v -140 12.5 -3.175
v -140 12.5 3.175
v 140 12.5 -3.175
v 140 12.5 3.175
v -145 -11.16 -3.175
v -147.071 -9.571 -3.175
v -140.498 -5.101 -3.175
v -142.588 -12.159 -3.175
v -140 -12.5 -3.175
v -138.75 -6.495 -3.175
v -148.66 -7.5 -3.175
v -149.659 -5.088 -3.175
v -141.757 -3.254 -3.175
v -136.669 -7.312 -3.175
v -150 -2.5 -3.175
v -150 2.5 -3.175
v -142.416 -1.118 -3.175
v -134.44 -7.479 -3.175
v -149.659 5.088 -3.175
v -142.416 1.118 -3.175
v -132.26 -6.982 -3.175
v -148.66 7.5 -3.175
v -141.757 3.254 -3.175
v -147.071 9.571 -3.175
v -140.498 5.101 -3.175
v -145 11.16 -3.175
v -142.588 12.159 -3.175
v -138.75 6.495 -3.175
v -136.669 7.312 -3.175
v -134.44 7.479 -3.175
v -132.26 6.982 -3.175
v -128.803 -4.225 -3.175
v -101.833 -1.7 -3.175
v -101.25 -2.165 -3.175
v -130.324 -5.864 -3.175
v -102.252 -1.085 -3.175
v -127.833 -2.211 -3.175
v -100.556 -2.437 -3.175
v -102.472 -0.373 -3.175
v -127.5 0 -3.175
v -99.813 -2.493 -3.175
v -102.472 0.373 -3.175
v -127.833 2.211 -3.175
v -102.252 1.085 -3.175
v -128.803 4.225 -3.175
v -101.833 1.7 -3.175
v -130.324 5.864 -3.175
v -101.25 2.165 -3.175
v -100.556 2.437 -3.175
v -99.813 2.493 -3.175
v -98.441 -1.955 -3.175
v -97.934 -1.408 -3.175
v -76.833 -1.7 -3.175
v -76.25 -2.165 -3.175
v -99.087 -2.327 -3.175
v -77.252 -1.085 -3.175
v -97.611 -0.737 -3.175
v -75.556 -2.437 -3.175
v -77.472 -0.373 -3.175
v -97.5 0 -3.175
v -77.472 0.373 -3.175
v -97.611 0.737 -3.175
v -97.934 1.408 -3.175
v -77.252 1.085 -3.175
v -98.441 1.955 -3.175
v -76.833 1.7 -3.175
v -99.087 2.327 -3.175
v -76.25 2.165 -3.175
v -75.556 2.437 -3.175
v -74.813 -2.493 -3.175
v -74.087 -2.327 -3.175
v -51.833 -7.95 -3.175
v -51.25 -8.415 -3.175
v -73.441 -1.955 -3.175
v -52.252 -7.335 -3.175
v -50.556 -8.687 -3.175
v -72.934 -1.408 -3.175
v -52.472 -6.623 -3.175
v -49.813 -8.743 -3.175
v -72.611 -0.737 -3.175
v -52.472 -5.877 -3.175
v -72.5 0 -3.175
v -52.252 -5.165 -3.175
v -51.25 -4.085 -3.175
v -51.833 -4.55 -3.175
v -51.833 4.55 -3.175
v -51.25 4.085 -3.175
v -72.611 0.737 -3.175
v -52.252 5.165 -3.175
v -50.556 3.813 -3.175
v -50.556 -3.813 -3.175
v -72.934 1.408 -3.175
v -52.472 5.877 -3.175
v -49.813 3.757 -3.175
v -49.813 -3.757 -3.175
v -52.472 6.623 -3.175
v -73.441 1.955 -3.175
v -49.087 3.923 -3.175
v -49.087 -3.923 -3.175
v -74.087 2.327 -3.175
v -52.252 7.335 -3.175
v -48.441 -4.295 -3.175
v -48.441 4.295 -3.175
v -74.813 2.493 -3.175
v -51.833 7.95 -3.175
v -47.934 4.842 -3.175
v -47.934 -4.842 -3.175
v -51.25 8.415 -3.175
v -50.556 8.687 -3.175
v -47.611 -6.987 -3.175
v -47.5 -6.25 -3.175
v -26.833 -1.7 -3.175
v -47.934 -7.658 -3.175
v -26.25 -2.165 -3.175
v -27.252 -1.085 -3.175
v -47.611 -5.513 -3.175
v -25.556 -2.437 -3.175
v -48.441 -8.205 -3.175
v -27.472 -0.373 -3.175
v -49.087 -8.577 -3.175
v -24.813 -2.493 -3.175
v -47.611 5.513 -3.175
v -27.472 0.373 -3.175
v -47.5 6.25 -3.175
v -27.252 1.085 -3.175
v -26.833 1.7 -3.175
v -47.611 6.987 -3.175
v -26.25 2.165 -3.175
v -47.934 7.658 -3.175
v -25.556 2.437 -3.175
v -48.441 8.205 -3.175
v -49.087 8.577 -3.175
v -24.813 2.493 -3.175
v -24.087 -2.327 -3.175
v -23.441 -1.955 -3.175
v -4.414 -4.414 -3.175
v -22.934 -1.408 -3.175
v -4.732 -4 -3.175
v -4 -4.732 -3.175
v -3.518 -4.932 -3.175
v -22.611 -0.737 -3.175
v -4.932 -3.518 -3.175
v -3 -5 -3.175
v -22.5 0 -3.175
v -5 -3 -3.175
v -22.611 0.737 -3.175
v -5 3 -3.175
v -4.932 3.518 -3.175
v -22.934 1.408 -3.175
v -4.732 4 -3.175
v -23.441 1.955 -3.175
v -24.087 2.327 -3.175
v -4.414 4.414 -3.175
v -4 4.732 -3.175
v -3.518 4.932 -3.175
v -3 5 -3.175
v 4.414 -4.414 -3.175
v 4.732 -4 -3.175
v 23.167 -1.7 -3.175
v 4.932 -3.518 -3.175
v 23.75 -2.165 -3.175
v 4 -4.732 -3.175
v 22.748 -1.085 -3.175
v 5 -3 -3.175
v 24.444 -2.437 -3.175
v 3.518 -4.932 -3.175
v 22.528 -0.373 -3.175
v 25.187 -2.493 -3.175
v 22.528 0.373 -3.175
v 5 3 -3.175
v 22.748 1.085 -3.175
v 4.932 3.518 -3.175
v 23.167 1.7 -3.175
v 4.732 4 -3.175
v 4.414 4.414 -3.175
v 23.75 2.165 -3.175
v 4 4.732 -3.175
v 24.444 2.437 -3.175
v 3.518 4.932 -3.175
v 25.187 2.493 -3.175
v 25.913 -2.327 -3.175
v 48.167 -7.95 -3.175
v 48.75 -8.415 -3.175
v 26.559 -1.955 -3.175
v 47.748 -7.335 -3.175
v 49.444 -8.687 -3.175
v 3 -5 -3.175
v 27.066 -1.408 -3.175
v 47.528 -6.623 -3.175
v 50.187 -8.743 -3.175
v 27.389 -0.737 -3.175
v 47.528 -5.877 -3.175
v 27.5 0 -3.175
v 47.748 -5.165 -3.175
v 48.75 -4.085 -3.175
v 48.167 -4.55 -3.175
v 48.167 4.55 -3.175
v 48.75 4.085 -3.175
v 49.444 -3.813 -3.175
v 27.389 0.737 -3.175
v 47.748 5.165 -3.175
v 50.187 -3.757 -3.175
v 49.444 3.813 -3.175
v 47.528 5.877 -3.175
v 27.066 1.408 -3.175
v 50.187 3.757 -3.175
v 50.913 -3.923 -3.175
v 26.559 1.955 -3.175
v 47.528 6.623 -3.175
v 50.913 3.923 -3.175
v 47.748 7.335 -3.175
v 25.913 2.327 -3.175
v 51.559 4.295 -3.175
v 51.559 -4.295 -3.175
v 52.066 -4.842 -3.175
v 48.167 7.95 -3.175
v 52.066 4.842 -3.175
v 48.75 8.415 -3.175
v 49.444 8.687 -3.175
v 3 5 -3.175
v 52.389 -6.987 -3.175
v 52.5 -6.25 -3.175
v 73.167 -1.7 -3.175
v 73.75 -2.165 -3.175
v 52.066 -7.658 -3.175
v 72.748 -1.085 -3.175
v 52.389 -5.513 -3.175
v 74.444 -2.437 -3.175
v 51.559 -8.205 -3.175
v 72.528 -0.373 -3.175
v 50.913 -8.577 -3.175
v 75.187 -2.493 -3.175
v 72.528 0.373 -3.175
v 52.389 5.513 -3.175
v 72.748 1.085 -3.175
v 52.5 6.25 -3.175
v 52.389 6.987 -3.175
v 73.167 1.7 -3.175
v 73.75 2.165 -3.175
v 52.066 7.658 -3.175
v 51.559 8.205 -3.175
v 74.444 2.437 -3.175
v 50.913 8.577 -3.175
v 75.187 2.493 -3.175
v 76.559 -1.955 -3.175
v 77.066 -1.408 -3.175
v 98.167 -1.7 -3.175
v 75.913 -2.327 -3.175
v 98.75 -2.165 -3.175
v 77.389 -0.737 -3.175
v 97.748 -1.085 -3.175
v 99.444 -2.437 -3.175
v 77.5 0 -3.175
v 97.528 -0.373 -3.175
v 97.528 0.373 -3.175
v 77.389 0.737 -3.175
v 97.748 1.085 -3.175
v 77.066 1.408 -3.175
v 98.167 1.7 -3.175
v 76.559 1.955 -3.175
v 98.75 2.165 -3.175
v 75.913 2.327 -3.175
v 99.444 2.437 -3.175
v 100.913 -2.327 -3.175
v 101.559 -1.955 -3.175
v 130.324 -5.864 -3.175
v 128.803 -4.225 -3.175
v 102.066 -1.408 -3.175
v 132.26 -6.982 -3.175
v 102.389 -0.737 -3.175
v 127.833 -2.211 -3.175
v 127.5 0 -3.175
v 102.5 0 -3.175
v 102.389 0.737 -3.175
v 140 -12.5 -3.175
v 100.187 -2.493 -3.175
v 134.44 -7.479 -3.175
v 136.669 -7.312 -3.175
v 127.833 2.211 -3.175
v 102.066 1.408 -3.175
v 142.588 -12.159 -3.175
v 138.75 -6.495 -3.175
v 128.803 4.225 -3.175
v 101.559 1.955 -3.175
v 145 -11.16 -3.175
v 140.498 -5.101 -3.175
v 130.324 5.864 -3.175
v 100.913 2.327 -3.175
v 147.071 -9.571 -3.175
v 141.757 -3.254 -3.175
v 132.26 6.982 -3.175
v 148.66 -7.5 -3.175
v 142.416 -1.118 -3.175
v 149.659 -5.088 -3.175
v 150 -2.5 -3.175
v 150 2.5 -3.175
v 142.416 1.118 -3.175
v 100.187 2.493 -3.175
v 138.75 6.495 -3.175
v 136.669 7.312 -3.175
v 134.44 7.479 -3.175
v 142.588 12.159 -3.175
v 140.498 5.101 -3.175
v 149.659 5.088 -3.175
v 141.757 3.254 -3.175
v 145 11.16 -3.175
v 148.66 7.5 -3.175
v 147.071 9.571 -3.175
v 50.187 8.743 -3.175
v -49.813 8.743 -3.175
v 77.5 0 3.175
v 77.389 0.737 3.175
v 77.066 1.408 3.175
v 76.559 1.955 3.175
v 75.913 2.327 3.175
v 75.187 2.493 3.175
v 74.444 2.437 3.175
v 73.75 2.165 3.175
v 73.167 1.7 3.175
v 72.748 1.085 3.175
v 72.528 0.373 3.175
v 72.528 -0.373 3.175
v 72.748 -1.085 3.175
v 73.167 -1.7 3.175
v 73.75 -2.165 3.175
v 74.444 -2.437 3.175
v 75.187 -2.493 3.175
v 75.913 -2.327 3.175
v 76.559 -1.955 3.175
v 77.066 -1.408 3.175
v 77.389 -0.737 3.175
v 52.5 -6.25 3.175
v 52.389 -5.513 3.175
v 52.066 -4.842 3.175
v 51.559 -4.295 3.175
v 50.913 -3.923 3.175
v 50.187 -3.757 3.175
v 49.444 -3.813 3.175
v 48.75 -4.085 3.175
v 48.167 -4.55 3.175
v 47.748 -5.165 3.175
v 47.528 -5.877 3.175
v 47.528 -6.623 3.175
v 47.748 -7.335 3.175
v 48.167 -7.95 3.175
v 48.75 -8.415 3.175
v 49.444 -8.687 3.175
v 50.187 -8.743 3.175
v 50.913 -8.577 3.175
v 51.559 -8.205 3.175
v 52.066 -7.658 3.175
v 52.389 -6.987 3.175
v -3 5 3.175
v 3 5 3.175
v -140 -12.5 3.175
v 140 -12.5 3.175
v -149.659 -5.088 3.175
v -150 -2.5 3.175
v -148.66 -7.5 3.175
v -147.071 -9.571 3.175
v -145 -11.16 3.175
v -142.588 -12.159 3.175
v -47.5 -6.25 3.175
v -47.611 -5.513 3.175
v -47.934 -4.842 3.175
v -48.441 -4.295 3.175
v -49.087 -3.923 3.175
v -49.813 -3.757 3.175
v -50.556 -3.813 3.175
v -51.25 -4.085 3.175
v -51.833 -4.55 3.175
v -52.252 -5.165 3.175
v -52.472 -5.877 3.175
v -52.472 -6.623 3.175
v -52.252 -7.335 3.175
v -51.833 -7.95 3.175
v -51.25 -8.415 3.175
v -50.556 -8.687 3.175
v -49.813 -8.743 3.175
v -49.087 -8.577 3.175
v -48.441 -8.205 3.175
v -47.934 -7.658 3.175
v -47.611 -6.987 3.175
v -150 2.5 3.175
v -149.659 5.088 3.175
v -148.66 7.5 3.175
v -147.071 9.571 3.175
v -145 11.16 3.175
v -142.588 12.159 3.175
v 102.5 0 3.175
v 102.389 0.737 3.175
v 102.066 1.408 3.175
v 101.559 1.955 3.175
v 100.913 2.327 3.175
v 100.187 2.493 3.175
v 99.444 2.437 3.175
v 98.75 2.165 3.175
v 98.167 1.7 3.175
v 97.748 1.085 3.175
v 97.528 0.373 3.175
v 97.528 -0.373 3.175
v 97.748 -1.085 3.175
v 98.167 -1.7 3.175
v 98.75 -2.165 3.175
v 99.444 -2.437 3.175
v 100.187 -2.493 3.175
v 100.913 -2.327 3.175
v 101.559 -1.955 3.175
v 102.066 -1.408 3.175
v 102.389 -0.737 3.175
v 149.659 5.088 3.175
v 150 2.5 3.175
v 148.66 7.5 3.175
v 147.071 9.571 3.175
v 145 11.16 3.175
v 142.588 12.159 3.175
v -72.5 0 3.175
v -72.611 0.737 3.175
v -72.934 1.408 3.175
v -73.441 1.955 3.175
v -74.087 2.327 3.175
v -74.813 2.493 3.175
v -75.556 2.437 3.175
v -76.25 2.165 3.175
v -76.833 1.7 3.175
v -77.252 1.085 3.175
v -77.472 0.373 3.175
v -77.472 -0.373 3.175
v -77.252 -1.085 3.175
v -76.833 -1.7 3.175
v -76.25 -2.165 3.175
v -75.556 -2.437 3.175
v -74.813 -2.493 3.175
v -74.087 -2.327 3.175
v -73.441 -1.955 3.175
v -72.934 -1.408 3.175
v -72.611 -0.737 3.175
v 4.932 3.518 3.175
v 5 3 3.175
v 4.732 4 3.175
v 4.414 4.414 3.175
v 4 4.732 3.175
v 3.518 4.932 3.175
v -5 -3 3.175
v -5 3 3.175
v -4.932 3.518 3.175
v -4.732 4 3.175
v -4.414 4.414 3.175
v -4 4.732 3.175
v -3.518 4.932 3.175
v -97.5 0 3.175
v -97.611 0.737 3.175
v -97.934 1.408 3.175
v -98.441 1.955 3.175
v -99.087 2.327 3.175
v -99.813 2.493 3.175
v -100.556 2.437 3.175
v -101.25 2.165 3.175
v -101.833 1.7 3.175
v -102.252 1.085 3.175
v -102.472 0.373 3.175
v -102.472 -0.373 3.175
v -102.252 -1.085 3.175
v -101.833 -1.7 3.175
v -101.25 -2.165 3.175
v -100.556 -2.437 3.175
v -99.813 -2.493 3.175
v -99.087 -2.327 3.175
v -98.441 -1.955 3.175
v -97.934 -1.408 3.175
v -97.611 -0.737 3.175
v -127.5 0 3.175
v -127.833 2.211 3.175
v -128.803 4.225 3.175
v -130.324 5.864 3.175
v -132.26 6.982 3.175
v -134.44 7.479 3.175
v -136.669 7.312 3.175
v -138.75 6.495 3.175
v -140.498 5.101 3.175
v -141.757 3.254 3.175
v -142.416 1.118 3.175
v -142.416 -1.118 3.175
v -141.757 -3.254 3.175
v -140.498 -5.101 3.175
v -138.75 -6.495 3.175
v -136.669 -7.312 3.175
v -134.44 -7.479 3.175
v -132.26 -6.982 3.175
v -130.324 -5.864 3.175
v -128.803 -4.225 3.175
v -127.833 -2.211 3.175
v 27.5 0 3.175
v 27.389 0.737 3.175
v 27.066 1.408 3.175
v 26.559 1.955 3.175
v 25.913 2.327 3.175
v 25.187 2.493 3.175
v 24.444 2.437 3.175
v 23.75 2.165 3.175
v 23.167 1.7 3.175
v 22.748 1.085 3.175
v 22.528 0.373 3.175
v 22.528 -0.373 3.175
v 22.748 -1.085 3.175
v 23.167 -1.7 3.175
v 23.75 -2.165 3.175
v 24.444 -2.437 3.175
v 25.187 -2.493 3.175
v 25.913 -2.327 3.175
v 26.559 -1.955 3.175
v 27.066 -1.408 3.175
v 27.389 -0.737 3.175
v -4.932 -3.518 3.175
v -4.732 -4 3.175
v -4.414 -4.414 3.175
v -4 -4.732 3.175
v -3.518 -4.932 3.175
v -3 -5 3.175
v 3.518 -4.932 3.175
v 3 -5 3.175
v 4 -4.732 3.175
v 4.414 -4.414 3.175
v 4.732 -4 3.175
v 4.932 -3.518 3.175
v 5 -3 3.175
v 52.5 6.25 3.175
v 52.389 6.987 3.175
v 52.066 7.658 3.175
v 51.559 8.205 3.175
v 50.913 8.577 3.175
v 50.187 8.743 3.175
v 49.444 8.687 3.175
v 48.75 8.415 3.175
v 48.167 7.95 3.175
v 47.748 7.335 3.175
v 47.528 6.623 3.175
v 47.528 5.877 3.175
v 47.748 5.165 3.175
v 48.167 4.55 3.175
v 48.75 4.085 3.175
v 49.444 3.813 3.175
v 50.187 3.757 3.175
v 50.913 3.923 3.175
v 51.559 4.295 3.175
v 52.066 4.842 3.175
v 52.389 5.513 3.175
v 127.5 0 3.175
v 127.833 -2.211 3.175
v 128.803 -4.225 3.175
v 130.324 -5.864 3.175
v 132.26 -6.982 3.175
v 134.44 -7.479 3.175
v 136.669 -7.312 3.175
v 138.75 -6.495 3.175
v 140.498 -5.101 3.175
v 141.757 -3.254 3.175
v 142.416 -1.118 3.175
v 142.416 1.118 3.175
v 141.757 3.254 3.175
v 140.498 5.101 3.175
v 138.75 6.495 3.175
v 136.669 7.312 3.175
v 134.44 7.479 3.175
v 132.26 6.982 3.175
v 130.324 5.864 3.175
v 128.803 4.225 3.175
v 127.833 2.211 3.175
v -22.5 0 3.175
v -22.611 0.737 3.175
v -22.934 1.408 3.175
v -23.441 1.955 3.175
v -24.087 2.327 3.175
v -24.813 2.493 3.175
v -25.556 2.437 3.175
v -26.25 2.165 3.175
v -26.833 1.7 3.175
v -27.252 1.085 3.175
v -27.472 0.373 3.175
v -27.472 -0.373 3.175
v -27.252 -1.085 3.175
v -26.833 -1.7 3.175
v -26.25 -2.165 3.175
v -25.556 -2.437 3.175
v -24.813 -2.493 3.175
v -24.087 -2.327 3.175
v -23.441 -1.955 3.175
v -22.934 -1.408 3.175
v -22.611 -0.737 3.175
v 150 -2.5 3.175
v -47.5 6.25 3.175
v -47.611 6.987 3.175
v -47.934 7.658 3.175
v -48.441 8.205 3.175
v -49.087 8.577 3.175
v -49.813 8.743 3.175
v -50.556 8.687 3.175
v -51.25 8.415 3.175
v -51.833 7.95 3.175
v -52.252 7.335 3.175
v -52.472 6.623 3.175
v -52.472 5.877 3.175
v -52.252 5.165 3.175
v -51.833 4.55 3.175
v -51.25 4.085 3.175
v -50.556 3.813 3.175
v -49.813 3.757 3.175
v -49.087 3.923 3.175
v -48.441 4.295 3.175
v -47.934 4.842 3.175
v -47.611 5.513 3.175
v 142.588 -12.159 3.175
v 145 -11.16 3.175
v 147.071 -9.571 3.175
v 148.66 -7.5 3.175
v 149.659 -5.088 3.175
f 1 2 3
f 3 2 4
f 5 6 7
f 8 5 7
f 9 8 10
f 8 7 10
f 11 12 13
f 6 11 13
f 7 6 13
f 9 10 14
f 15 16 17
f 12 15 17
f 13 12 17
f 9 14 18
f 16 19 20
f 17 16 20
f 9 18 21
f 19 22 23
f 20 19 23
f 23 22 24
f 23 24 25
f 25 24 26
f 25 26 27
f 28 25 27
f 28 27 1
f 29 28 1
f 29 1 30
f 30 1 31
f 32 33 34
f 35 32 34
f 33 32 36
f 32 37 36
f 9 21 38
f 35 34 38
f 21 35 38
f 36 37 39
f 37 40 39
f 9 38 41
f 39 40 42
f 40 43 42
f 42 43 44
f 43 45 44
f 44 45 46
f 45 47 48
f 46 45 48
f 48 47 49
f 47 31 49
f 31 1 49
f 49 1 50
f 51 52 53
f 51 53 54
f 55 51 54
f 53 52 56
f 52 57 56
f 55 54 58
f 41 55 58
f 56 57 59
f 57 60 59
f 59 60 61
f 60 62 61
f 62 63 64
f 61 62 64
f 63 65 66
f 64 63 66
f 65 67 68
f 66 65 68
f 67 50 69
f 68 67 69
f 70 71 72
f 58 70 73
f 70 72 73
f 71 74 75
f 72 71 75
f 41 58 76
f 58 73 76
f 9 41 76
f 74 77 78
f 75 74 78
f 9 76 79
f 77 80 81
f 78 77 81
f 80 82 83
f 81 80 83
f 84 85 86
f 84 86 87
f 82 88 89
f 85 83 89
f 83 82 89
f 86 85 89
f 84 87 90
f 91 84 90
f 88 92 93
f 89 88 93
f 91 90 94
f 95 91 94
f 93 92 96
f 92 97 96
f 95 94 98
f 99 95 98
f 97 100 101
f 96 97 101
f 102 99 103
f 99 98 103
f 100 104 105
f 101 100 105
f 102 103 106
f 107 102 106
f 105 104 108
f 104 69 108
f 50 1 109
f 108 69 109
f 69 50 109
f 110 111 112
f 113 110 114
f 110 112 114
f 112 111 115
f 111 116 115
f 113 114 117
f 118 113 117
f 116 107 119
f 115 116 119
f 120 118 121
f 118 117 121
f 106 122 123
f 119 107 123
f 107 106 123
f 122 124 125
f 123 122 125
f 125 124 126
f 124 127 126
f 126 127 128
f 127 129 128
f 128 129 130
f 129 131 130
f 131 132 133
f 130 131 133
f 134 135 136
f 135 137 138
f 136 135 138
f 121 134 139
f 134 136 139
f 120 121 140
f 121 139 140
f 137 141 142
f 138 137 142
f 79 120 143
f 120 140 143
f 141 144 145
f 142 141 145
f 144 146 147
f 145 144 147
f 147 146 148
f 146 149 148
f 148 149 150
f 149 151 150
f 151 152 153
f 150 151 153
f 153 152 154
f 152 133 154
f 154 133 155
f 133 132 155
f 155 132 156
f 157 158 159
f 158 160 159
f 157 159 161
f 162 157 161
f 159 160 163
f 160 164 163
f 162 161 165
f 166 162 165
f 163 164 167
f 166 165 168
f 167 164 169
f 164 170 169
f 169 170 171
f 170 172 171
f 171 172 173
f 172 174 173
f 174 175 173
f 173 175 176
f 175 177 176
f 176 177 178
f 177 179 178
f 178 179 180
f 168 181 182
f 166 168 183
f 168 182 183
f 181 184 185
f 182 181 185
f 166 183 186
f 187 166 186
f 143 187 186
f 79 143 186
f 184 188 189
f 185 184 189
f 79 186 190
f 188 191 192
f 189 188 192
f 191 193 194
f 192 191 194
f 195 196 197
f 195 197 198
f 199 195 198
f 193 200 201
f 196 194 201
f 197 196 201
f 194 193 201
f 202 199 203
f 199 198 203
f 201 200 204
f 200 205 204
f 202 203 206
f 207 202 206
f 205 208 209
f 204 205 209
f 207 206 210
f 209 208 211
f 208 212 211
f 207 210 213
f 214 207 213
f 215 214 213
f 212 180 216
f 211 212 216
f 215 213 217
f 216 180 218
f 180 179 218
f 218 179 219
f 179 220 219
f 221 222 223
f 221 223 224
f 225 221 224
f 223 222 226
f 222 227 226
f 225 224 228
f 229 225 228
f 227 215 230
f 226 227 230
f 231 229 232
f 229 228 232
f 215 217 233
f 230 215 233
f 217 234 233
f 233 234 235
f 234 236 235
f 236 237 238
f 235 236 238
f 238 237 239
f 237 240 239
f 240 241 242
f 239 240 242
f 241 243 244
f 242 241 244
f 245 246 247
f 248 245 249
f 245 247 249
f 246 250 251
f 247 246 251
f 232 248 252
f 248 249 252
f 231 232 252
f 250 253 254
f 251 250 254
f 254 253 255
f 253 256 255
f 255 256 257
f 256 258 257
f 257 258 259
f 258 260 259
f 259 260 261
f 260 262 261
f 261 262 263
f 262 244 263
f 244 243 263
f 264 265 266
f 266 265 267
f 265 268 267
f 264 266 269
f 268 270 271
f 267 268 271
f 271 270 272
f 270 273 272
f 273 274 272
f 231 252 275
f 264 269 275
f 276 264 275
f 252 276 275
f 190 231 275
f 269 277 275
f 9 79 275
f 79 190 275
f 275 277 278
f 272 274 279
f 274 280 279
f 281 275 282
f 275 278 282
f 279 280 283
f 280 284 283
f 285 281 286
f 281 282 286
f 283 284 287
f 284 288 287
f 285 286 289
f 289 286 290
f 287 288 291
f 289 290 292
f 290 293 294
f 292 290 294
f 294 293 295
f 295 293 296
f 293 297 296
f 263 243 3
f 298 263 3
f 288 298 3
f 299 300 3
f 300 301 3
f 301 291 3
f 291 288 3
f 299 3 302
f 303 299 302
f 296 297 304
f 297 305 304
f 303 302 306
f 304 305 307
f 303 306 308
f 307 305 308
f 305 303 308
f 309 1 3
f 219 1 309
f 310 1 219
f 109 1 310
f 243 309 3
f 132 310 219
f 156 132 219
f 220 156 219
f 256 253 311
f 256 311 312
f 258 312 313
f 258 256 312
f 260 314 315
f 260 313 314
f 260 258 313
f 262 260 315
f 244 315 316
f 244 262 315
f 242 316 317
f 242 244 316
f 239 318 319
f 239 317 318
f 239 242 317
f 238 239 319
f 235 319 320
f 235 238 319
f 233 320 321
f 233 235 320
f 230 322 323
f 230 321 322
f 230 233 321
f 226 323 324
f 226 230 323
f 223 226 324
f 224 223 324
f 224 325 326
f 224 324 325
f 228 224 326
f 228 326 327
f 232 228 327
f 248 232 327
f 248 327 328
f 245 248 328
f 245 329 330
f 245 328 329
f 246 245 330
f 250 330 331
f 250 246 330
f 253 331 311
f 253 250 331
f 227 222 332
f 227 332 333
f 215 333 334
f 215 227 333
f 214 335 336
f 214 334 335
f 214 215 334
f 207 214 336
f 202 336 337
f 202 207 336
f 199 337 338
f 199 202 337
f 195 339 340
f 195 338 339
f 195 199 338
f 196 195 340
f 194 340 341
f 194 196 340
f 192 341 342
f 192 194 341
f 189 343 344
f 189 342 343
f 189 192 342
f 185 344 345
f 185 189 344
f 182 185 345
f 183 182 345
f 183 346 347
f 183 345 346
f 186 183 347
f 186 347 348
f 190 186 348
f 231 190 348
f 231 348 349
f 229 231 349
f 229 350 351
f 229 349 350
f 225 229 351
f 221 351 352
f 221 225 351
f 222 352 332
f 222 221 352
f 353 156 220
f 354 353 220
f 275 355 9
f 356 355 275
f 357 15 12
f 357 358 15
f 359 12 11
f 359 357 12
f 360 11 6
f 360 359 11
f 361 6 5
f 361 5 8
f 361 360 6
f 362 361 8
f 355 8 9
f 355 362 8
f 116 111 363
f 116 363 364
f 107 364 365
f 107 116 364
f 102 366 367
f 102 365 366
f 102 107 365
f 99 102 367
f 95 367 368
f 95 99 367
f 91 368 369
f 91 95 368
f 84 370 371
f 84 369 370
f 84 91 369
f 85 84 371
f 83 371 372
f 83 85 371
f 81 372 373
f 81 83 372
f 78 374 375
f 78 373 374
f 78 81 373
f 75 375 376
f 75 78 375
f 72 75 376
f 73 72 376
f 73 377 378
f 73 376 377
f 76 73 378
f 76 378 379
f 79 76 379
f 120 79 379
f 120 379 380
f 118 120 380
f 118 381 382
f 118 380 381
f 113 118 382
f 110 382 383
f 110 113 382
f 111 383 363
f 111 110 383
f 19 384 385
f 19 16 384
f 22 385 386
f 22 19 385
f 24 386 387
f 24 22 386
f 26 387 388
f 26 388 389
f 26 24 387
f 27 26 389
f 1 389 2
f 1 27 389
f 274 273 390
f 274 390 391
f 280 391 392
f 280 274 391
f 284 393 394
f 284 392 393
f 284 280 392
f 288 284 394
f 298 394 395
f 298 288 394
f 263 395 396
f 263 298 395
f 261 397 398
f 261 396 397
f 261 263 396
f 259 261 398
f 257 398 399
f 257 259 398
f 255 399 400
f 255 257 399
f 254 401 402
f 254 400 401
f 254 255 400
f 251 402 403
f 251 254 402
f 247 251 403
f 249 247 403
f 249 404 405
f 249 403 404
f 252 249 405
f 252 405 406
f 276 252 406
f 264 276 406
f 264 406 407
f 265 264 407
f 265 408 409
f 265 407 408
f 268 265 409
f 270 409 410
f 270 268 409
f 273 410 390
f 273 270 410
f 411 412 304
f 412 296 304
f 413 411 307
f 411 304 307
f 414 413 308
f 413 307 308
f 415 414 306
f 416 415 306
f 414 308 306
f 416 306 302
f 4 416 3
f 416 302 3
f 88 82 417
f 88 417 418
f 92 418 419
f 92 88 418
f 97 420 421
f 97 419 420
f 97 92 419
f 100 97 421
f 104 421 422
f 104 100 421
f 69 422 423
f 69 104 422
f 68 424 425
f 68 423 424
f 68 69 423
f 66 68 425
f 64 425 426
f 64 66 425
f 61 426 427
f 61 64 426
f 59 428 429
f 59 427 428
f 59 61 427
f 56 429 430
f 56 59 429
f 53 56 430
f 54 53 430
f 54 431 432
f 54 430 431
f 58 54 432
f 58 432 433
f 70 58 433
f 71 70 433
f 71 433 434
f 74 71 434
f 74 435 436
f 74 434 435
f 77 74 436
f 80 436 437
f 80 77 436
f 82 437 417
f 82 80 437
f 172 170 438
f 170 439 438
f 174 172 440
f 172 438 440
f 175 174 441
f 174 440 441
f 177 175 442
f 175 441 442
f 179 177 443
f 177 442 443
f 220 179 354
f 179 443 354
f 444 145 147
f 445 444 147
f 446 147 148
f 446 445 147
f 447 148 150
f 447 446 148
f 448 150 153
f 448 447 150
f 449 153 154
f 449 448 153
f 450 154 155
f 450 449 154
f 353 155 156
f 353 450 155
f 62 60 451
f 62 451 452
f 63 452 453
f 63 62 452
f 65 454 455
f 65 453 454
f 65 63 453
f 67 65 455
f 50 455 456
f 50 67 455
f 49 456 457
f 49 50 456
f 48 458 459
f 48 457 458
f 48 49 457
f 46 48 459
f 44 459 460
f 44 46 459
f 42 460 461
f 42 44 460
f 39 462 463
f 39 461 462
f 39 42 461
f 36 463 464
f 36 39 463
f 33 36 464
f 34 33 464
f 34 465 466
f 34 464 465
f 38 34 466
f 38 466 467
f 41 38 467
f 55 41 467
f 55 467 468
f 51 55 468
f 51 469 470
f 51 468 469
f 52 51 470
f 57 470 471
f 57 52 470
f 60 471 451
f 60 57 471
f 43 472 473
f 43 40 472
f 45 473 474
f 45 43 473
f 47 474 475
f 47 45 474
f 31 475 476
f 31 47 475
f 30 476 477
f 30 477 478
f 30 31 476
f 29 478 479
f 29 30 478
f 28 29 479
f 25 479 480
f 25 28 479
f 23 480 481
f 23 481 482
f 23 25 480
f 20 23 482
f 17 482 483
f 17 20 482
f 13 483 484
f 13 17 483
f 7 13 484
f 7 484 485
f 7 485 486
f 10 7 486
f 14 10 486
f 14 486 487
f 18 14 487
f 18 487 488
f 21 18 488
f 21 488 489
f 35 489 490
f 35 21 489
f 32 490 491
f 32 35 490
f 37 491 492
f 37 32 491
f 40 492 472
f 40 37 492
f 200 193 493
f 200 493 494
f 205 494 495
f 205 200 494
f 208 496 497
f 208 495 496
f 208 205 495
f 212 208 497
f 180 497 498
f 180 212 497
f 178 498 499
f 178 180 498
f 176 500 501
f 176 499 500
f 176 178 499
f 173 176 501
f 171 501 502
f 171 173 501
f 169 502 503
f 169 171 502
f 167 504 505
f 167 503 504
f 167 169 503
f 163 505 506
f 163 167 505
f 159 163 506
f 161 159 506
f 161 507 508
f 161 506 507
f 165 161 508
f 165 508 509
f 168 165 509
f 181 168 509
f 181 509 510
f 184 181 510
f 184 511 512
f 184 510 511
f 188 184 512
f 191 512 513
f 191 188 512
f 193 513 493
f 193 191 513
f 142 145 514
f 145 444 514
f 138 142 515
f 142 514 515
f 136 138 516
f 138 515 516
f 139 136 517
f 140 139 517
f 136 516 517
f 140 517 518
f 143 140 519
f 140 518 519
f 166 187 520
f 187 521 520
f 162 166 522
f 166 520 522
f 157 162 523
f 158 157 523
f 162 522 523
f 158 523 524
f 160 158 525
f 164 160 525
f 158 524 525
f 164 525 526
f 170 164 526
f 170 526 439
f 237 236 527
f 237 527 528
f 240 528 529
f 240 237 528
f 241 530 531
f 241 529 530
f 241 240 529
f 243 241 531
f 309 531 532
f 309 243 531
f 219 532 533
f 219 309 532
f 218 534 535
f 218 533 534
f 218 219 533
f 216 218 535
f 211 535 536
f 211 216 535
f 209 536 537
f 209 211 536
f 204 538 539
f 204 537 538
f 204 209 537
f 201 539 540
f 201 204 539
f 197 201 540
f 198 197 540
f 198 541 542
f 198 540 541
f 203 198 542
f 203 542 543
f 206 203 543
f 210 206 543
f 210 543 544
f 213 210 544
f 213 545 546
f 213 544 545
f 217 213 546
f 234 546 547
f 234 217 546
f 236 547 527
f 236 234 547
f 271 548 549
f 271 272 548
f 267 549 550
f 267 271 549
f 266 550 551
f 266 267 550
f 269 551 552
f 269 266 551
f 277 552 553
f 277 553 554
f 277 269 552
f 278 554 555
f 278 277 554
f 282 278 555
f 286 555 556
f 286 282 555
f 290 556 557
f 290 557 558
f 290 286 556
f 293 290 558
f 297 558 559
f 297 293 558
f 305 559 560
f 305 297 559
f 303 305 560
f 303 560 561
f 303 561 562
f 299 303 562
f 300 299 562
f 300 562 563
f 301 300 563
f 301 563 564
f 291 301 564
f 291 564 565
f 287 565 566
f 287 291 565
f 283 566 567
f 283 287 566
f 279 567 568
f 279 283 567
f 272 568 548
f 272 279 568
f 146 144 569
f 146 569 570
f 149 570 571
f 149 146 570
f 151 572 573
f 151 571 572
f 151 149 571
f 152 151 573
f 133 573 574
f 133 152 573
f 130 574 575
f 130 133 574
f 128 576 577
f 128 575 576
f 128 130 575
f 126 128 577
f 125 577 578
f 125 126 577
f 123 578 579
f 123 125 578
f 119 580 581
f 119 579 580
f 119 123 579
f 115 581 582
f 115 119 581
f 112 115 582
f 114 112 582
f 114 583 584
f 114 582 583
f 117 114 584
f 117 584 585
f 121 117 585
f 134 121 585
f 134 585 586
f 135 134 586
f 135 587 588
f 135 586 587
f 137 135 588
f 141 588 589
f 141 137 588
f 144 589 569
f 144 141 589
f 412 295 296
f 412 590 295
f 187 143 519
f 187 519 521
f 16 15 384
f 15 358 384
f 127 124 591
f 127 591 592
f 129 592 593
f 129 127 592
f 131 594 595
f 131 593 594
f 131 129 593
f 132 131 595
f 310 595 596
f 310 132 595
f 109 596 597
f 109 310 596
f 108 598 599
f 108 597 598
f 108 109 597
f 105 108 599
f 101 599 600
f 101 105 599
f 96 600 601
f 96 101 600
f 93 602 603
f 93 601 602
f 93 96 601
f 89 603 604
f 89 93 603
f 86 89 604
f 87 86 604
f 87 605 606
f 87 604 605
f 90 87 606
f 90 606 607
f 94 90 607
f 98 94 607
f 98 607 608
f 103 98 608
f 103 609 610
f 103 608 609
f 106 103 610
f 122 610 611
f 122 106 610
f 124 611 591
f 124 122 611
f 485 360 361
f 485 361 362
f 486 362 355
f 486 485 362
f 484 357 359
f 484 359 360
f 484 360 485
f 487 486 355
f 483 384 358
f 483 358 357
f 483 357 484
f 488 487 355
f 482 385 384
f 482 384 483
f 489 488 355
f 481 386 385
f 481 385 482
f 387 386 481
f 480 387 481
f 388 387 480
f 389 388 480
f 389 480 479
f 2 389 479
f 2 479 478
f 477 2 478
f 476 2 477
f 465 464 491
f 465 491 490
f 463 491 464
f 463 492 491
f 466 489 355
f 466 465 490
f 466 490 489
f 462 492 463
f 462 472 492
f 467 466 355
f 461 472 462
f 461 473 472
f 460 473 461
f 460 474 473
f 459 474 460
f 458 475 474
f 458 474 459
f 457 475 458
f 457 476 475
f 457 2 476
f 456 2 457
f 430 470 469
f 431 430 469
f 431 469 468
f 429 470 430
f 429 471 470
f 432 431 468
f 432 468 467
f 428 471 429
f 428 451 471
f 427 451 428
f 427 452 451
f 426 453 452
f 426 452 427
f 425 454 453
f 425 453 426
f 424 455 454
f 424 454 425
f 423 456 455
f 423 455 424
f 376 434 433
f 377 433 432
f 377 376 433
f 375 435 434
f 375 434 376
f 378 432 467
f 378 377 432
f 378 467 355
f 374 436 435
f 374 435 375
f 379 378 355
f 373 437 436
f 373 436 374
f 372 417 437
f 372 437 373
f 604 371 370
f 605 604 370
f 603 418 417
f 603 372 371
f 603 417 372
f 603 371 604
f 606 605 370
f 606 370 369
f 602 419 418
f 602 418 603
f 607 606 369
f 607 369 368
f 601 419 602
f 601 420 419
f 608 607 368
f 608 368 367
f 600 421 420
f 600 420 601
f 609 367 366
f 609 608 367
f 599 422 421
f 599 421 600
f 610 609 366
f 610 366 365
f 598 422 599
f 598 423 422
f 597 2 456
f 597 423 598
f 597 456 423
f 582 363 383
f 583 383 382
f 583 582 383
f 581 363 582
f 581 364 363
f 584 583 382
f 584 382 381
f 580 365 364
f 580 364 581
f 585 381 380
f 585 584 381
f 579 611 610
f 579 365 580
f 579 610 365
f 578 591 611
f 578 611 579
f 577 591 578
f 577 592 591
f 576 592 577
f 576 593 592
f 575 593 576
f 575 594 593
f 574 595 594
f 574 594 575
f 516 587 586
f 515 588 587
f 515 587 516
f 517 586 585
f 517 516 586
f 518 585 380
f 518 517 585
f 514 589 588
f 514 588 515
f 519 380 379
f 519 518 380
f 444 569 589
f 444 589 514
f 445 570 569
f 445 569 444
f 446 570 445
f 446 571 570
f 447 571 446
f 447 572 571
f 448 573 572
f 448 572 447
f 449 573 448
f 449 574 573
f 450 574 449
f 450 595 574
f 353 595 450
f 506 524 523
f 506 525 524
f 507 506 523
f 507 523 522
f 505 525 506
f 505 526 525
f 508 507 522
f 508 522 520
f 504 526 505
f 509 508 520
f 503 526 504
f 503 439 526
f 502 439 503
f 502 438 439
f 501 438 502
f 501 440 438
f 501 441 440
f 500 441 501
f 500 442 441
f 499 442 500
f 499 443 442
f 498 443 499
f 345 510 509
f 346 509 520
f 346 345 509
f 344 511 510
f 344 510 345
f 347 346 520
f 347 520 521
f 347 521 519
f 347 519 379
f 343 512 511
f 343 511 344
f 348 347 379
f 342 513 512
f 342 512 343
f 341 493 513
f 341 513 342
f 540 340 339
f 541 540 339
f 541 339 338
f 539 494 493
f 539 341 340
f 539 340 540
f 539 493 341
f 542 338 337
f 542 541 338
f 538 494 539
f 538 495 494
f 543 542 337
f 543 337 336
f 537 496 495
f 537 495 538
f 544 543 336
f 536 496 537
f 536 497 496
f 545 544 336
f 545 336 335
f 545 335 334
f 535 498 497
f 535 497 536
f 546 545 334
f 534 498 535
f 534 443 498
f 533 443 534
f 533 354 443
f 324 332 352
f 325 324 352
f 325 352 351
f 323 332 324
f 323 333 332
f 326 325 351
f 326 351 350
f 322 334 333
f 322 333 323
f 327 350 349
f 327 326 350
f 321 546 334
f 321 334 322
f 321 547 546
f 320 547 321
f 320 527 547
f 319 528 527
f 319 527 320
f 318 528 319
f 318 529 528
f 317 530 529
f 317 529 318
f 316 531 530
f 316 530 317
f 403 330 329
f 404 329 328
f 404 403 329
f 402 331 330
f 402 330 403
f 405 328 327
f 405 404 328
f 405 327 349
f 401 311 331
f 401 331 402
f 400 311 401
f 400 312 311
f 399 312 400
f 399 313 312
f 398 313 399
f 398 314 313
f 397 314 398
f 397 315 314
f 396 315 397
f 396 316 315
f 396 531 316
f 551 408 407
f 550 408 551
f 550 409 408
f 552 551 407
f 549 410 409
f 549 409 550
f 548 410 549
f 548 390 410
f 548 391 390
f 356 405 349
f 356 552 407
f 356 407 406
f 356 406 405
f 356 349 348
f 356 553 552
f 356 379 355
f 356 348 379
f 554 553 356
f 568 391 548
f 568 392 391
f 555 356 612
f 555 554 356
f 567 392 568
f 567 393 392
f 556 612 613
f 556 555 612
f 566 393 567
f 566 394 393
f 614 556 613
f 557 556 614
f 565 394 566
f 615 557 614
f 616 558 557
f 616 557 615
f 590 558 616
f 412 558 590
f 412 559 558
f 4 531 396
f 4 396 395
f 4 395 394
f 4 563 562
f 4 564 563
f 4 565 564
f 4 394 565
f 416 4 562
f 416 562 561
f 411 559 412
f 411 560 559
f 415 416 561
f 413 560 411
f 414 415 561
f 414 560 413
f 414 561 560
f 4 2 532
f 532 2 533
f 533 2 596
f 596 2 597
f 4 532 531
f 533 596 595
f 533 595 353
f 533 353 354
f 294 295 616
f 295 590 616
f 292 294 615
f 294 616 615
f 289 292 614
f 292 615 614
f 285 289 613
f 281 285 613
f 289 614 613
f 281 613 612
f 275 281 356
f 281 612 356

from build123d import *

# Parameters (mm, degrees)
SKETCH1_W               = 300
SKETCH1_H               = 25
SKETCH1_R               = 7.5
BOSS_EXTRUDE1_DEPTH     = 3.175
FILLET1_R               = 10
CUT_EXTRUDE1_DEPTH      = 151.653816746
CUT_EXTRUDE1_DEPTH_BACK = 151.653816746
SKETCH2_R               = 2.5
SKETCH2_W               = 10
SKETCH2_H               = 10
FILLET2_R               = 2
CUT_EXTRUDE2_DEPTH      = 151.653816746
CUT_EXTRUDE2_DEPTH_BACK = 151.653816746
SKETCH3_R               = 2.5


with BuildPart() as part:
    # Sketch1 → Boss-Extrude1 (new, symmetric)
    with BuildSketch(Plane.XY):
        Rectangle(SKETCH1_W, SKETCH1_H)
        with Locations((-135, 0)):
            Circle(SKETCH1_R, mode=Mode.SUBTRACT)
        with Locations(Location((135, 0, 0), (0, 0, 180))):
            Circle(SKETCH1_R, mode=Mode.SUBTRACT)
    extrude(amount=BOSS_EXTRUDE1_DEPTH, both=True)

    # Fillet1
    fillet1_edges = [part.edges().sort_by_distance(p)[0] for p in [
        (150, -12.5, 0),
        (-150, -12.5, 0),
        (-150, 12.5, 0),
        (150, 12.5, 0),
    ]]
    fillet(fillet1_edges, radius=FILLET1_R)

    # Sketch2 → Cut-Extrude1 (cut, two sides: drawn at the far end of the back side and taken through both)
    with BuildSketch(Plane.XY.offset(3.175).offset(-CUT_EXTRUDE1_DEPTH_BACK)):
        with Locations((-25, 0)):
            Circle(SKETCH2_R)
        with Locations((-75, 0)):
            Circle(SKETCH2_R)
        with Locations((25, 0)):
            Circle(SKETCH2_R)
        with Locations((75, 0)):
            Circle(SKETCH2_R)
        Rectangle(SKETCH2_W, SKETCH2_H)
    extrude(amount=CUT_EXTRUDE1_DEPTH + CUT_EXTRUDE1_DEPTH_BACK, mode=Mode.SUBTRACT)

    # Fillet2
    fillet2_edges = [part.edges().sort_by_distance(p)[0] for p in [
        (5, 5, 0),
        (5, -5, 0),
        (-5, -5, 0),
        (-5, 5, 0),
    ]]
    fillet(fillet2_edges, radius=FILLET2_R)

    # Sketch3 → Cut-Extrude2 (cut, two sides: drawn at the far end of the back side and taken through both)
    with BuildSketch(Plane.XY.offset(3.175).offset(-CUT_EXTRUDE2_DEPTH_BACK)):
        with Locations((-50, 6.25)):
            Circle(SKETCH3_R)
        with Locations((-50, -6.25)):
            Circle(SKETCH3_R)
        with Locations((50, -6.25)):
            Circle(SKETCH3_R)
        with Locations((50, 6.25)):
            Circle(SKETCH3_R)
        with Locations((-100, 0)):
            Circle(SKETCH3_R)
        with Locations((100, 0)):
            Circle(SKETCH3_R)
    extrude(amount=CUT_EXTRUDE2_DEPTH + CUT_EXTRUDE2_DEPTH_BACK, mode=Mode.SUBTRACT)


solid = part.part
